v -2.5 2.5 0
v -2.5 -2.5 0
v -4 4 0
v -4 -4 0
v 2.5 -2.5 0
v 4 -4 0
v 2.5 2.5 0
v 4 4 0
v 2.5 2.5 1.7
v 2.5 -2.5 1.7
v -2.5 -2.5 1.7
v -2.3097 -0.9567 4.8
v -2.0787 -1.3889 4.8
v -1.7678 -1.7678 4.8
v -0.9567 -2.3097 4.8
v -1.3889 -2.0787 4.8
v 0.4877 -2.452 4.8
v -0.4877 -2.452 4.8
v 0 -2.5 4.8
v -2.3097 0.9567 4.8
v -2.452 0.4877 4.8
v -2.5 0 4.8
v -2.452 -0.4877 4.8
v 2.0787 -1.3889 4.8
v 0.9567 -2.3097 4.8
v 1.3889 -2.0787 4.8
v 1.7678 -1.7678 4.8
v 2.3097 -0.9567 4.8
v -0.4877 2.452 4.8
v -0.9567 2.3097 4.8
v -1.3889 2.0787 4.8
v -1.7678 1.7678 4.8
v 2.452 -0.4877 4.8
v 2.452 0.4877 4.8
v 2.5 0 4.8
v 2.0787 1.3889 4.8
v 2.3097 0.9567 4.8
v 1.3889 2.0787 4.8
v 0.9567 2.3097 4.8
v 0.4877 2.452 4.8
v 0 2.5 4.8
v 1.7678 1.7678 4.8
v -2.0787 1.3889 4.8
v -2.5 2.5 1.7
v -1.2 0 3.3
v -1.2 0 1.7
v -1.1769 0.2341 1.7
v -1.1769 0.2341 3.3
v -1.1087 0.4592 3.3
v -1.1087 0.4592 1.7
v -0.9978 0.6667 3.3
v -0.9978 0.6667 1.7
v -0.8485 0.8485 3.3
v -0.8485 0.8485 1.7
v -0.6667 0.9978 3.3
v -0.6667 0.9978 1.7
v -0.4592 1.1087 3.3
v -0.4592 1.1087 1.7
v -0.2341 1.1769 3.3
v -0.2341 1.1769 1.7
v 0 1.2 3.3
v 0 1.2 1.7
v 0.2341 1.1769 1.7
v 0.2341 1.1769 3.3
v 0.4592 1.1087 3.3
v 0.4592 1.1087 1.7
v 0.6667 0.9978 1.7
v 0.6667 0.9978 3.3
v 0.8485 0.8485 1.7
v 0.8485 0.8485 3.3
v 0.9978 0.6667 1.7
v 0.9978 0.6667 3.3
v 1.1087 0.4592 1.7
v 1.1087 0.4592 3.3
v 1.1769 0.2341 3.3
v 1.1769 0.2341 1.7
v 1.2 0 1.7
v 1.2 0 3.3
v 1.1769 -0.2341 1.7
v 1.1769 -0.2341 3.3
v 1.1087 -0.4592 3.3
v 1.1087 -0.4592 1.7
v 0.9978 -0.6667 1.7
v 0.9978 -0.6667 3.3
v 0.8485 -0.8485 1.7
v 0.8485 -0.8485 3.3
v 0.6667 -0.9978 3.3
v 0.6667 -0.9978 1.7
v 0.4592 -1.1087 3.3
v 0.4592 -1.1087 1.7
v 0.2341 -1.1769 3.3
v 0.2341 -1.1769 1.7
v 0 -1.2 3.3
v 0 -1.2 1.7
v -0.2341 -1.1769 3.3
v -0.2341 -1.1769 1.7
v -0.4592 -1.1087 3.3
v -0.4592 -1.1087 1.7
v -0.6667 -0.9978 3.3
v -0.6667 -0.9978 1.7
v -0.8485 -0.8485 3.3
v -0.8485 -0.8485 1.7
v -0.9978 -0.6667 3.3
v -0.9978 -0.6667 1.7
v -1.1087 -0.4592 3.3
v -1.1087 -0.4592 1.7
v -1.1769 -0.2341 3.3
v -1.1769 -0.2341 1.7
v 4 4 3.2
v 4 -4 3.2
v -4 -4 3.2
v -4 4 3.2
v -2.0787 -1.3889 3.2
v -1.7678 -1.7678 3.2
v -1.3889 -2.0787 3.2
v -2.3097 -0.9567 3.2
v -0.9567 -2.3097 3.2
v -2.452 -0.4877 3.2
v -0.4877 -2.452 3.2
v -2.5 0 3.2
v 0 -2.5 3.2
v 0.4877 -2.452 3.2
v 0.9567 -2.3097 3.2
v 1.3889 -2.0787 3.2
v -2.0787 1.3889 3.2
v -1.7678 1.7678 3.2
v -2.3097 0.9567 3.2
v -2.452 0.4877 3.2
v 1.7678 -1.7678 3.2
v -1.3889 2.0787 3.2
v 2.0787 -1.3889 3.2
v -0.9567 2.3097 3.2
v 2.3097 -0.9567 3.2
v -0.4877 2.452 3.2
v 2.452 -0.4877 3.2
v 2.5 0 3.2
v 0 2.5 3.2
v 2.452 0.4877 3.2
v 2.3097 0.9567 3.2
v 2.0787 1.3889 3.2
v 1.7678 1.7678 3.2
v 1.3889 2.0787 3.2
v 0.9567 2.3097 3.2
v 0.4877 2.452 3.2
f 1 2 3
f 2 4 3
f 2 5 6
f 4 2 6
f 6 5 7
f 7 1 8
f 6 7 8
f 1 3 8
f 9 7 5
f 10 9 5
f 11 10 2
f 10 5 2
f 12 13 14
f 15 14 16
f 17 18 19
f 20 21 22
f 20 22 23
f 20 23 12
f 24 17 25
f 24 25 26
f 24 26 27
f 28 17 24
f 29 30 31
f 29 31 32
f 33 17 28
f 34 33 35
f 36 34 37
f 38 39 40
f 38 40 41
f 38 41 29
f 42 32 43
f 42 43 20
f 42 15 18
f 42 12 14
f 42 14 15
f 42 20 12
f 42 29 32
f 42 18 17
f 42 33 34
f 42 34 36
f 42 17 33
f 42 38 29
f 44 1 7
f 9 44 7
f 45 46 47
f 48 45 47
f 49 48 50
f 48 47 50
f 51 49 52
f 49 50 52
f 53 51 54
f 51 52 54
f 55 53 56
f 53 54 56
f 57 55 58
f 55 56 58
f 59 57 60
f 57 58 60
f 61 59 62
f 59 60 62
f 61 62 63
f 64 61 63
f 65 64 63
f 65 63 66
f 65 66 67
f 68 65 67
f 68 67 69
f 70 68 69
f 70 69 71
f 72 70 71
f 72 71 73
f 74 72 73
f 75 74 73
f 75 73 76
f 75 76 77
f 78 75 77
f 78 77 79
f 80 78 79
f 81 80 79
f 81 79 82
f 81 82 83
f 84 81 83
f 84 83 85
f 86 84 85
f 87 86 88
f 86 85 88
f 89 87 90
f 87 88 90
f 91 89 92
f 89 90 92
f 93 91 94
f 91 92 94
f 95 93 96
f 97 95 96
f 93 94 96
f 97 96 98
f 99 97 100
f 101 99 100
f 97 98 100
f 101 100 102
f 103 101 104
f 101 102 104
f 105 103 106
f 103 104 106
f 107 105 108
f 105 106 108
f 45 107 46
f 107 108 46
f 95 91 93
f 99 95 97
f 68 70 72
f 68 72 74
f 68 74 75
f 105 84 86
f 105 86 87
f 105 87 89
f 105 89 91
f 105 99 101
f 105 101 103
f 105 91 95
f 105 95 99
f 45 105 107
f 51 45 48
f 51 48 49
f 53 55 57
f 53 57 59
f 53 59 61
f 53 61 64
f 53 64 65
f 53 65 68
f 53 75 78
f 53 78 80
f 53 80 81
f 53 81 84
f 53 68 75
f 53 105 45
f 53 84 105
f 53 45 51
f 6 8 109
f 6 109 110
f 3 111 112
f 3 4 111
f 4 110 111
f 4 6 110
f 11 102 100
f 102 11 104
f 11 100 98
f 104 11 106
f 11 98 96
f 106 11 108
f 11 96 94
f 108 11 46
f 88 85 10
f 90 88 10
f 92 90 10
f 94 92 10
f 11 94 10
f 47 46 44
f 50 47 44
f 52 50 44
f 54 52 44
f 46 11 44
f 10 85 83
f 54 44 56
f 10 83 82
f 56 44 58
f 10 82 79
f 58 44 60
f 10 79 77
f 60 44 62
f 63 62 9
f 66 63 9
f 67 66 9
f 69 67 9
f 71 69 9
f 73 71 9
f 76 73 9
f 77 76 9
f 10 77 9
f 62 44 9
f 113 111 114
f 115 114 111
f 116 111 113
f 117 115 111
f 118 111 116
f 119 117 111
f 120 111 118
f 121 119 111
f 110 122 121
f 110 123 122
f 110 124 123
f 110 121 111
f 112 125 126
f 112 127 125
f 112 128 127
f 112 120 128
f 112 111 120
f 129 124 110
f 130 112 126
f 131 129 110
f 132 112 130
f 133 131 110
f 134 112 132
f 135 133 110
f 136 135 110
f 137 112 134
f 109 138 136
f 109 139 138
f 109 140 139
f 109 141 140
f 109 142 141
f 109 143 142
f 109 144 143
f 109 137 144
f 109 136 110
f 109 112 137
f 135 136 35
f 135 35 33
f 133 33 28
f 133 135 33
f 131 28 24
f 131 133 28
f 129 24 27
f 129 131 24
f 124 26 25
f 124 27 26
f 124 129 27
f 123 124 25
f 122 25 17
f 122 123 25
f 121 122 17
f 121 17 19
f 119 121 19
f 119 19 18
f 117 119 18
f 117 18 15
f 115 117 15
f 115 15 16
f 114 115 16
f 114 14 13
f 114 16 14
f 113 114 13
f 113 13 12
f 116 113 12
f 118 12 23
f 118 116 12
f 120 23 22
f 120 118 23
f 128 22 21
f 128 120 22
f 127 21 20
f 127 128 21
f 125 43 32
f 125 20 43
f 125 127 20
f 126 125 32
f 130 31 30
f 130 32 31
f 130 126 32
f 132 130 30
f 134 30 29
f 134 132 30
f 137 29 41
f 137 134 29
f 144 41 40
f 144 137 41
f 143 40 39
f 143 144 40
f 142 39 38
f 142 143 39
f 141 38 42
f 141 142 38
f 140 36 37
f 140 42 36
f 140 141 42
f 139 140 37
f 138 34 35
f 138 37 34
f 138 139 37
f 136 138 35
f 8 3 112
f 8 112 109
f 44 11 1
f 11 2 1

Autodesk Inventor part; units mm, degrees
ref_plane "YZ Plane" through (0, 0, 0) normal (1, 0, 0) x (0, 1, 0)
ref_plane "XZ Plane" through (0, 0, 0) normal (0, 1, 0) x (-1, 0, 0)
ref_plane "XY Plane" through (0, 0, 0) normal (0, 0, 1) x (1, 0, 0)
sketch "Sketch1" plane through (0, 0, 0) normal (0, 0, 1) x (1, 0, 0)
  line L0 (-4, 4) -> (4, 4)
  line L1 (4, 4) -> (4, -4)
  line L2 (4, -4) -> (-4, -4)
  line L3 (-4, -4) -> (-4, 4)
  point P0 (0, 0)
  dimension "d0" = 8
  dimension "d1" = 8
  dimension "d2" = 4
  dimension "d3" = 4
extrude "Extrusion1" add sketch "Sketch1" along normal blind 3.2
shell "Shell1" thickness 1.5 removed faces 1 at (-1.3333, 1.3333, 0)
sketch "Sketch2" plane through (0, 0, 3.2) normal (0, 0, 1) x (1, 0, 0)
  circle A0 centre (0, 0) radius 2.5
  line L0 (4, 4) -> (4, -4) projected
  line L1 (4, -4) -> (-4, -4) projected
  dimension "d7" = 5
  dimension "d10" = 4
  dimension "d11" = 4
extrude "Extrusion2" add sketch "Sketch2" along normal blind 1.6
sketch "Sketch3" plane through (2.5, -2.5, 1.7) normal (0, 0, -1) x (-1, 0, 0)
  circle A0 centre (2.5, 2.5) radius 2.5 projected
  circle A1 centre (2.5, 2.5) radius 1.2
  point P0 (2.5, 2.5)
  dimension "d18" = 2.4
extrude "Extrusion3" cut sketch "Sketch3" against normal blind 1.6 contours A1
pattern_of_one "Rectangular Pattern1"
sketch "Sketch4" plane through (2.5, -2.5, 1.7) normal (0, 0, -1) x (-1, 0, 0)
  circle A0 centre (2.5, 2.5) radius 1.2 projected
  line L0 (0, 5) -> (0, 0) projected
  line L1 (0, 0) -> (5, 0) projected
  circle A1 centre (6.5, 6.5) radius 3.15
  circle A2 centre (6.5, 6.5) radius 2.5
  point P0 (2.5, 2.5)
  dimension "d21" = 6.5
  dimension "d22" = 6.5
  dimension "d24" = 2.5
  dimension "d25" = 5
  dimension "d26" = 6.3
extrude "Extrusion4" [suppressed]
pattern_linear "Rectangular Pattern2" [suppressed]
equation "\"d0\" = 8 * WIDTH"
equation "\"d1\" = 8 * LENGTH"
equation "\"d2\" = 0.5 * d0"
equation "\"d3\" = 0.5 * d1"
equation "\"d4\" = HEIGHT"
equation "\"d21\" = 0.5 * d23 + 0.5 * d24"
equation "\"d22\" = d21"
equation "\"WIDTH\" = 1"
equation "\"HEIGHT\" = 3.2"
equation "\"LENGTH\" = 1"
equation "\"d23\" = 10.5"
properties part number "3024" material "Steel"
